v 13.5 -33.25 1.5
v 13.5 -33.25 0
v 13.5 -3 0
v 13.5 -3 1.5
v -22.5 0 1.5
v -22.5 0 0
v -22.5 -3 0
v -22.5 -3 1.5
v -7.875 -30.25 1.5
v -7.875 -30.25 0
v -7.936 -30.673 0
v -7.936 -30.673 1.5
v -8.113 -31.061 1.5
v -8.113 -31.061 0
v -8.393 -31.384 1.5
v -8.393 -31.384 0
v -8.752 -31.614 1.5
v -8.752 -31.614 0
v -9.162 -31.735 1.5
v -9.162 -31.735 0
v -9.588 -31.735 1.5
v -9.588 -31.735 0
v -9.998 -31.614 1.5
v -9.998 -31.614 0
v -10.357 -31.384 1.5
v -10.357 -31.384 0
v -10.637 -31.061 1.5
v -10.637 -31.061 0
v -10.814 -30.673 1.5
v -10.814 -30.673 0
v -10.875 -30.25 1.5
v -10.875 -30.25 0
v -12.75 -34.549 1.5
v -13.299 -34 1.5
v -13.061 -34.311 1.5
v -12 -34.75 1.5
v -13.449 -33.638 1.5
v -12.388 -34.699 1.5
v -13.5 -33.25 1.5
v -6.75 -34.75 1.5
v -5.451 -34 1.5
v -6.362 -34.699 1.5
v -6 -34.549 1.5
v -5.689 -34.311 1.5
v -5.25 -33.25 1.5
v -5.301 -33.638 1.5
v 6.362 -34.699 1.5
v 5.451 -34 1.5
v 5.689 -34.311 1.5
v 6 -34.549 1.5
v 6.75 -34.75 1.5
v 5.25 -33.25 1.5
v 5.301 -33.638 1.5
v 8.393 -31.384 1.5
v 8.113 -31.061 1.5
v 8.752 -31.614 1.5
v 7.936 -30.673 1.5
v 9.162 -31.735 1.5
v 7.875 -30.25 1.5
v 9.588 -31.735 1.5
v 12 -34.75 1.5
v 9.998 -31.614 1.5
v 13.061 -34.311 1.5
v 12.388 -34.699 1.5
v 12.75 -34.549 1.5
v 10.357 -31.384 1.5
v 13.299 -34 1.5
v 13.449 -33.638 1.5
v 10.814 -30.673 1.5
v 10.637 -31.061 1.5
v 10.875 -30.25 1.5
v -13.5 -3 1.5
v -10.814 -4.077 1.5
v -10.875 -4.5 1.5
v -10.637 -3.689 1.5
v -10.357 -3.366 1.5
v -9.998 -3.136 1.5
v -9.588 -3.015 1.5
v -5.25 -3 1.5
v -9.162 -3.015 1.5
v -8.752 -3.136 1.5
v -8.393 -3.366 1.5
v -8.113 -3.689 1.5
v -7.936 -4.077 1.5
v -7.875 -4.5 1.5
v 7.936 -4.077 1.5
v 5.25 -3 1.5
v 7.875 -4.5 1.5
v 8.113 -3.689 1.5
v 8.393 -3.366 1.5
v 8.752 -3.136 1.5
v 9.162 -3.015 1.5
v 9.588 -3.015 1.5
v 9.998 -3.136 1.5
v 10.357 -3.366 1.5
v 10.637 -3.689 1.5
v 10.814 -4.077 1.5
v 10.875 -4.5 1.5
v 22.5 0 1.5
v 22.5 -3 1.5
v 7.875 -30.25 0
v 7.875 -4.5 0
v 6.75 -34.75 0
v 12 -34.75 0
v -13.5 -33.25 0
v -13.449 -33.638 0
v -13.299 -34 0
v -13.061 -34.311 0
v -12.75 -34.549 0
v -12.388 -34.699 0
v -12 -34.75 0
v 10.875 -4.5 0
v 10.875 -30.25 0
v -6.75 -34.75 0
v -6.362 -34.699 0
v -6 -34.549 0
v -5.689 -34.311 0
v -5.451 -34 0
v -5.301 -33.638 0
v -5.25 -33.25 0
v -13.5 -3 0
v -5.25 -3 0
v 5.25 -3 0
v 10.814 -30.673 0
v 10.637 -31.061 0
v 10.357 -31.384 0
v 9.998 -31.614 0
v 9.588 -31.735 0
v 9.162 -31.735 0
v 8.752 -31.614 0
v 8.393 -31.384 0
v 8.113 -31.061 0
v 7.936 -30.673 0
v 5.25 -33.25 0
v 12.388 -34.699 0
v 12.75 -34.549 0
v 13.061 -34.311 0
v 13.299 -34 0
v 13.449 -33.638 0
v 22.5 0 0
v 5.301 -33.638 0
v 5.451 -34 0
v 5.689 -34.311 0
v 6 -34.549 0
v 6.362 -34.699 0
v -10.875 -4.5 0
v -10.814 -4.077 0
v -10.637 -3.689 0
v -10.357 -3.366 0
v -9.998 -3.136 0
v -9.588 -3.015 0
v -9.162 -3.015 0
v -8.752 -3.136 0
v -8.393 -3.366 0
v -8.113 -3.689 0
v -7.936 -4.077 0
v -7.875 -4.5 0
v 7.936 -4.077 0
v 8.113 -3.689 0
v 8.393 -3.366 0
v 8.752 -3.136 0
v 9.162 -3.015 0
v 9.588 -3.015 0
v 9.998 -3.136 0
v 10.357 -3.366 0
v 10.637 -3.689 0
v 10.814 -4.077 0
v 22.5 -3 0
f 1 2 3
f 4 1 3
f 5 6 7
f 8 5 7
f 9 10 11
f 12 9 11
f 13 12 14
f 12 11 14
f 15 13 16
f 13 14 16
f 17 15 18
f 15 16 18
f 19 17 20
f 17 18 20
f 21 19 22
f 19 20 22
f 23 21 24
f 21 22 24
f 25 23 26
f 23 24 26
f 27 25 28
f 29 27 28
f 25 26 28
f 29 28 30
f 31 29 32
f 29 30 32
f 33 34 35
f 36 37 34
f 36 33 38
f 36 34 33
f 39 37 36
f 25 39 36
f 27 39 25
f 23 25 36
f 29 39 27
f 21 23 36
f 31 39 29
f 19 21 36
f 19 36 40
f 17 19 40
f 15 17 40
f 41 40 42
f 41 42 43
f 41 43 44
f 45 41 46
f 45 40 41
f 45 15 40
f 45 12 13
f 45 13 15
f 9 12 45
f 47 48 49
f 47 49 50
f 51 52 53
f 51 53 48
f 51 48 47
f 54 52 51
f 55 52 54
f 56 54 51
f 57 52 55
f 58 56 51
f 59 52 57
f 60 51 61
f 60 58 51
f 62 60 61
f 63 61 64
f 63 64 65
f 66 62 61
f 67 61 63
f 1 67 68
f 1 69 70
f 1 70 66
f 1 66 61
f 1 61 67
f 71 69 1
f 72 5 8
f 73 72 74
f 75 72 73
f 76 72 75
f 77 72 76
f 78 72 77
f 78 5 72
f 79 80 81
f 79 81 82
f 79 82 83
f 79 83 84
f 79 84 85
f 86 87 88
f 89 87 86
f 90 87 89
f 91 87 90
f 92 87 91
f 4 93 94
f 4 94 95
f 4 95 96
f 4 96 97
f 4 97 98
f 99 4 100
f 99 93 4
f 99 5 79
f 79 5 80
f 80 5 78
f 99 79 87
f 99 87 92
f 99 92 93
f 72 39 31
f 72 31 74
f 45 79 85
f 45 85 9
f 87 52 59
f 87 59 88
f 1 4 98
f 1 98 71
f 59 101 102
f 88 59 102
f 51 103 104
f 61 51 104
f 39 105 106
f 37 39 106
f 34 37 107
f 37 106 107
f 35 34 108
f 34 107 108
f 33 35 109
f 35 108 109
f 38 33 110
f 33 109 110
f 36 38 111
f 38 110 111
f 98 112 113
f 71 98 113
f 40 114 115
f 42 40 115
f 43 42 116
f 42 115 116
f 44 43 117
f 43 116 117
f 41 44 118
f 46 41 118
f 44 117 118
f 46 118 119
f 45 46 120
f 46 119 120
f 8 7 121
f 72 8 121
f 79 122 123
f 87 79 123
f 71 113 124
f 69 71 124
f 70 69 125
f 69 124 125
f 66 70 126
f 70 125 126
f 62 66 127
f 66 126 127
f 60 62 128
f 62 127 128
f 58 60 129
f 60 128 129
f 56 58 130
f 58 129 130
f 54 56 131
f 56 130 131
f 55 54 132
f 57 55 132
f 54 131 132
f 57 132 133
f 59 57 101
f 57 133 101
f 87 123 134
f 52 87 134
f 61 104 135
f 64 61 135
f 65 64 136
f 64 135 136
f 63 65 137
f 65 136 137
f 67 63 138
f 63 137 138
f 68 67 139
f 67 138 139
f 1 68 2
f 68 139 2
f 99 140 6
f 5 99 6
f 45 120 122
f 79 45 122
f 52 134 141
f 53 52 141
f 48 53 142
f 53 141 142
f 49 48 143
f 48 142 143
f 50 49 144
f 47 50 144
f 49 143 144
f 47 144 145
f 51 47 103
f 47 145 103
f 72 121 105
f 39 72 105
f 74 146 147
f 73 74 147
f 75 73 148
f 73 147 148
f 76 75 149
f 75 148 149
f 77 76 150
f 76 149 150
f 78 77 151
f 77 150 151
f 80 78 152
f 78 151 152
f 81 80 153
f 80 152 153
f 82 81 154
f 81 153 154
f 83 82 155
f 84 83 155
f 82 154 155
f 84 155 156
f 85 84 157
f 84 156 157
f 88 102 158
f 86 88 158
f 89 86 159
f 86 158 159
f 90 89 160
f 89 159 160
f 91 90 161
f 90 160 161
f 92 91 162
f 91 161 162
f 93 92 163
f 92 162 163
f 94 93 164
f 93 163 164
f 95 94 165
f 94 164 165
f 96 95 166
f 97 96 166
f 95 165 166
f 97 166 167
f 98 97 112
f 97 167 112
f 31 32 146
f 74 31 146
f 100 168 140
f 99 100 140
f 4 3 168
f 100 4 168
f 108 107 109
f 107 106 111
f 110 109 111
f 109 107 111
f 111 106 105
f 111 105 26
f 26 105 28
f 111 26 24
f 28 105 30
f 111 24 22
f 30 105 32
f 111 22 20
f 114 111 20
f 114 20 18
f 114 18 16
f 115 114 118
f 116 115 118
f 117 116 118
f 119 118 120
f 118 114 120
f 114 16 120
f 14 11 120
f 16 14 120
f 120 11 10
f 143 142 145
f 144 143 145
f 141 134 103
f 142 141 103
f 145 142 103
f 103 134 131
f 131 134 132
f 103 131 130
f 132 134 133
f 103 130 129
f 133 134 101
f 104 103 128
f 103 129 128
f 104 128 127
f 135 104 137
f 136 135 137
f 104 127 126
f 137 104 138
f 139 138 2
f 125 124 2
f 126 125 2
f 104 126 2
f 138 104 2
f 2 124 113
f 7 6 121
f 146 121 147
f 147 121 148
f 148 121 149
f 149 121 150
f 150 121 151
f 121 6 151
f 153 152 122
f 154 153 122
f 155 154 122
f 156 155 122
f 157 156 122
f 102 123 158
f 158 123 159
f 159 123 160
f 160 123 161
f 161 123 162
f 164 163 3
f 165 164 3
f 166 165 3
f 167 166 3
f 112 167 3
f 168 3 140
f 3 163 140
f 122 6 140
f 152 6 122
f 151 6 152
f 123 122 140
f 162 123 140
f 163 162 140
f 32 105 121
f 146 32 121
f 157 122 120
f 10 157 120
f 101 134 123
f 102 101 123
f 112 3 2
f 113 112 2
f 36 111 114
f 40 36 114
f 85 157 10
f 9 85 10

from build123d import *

# Parameters (mm, degrees)
F1_DEPTH = 1.5


with BuildPart() as f1:
    # F0 (on Top) → F1 (new body)
    with BuildSketch(Plane.XY):
        with BuildLine():
            Line((22.5, 0), (-22.5, 0))
            Line((-22.5, 0), (-22.5, -3))
            Line((-22.5, -3), (-13.5, -3))
            Line((-13.5, -3), (-13.5, -33.25))
            ThreePointArc((-13.5, -33.25), (-13.06066, -34.31066), (-12, -34.75))
            Line((-12, -34.75), (-6.75, -34.75))
            ThreePointArc((-6.75, -34.75), (-5.68934, -34.31066), (-5.25, -33.25))
            Line((-5.25, -33.25), (-5.25, -3))
            Line((-5.25, -3), (5.25, -3))
            Line((5.25, -3), (5.25, -33.25))
            ThreePointArc((5.25, -33.25), (5.68934, -34.31066), (6.75, -34.75))
            Line((6.75, -34.75), (12, -34.75))
            ThreePointArc((12, -34.75), (13.06066, -34.31066), (13.5, -33.25))
            Line((13.5, -33.25), (13.5, -3))
            Line((13.5, -3), (22.5, -3))
            Line((22.5, -3), (22.5, 0))
        make_face()
        with BuildLine():
            ThreePointArc((-10.875, -4.5), (-9.375, -3), (-7.875, -4.5))
            Line((-7.875, -4.5), (-7.875, -30.25))
            ThreePointArc((-7.875, -30.25), (-9.375, -31.75), (-10.875, -30.25))
            Line((-10.875, -30.25), (-10.875, -4.5))
        make_face(mode=Mode.SUBTRACT)
        with BuildLine():
            ThreePointArc((7.875, -4.5), (9.375, -3), (10.875, -4.5))
            Line((10.875, -4.5), (10.875, -30.25))
            ThreePointArc((10.875, -30.25), (9.375, -31.75), (7.875, -30.25))
            Line((7.875, -30.25), (7.875, -4.5))
        make_face(mode=Mode.SUBTRACT)
    extrude(amount=F1_DEPTH)


solid = f1.part
